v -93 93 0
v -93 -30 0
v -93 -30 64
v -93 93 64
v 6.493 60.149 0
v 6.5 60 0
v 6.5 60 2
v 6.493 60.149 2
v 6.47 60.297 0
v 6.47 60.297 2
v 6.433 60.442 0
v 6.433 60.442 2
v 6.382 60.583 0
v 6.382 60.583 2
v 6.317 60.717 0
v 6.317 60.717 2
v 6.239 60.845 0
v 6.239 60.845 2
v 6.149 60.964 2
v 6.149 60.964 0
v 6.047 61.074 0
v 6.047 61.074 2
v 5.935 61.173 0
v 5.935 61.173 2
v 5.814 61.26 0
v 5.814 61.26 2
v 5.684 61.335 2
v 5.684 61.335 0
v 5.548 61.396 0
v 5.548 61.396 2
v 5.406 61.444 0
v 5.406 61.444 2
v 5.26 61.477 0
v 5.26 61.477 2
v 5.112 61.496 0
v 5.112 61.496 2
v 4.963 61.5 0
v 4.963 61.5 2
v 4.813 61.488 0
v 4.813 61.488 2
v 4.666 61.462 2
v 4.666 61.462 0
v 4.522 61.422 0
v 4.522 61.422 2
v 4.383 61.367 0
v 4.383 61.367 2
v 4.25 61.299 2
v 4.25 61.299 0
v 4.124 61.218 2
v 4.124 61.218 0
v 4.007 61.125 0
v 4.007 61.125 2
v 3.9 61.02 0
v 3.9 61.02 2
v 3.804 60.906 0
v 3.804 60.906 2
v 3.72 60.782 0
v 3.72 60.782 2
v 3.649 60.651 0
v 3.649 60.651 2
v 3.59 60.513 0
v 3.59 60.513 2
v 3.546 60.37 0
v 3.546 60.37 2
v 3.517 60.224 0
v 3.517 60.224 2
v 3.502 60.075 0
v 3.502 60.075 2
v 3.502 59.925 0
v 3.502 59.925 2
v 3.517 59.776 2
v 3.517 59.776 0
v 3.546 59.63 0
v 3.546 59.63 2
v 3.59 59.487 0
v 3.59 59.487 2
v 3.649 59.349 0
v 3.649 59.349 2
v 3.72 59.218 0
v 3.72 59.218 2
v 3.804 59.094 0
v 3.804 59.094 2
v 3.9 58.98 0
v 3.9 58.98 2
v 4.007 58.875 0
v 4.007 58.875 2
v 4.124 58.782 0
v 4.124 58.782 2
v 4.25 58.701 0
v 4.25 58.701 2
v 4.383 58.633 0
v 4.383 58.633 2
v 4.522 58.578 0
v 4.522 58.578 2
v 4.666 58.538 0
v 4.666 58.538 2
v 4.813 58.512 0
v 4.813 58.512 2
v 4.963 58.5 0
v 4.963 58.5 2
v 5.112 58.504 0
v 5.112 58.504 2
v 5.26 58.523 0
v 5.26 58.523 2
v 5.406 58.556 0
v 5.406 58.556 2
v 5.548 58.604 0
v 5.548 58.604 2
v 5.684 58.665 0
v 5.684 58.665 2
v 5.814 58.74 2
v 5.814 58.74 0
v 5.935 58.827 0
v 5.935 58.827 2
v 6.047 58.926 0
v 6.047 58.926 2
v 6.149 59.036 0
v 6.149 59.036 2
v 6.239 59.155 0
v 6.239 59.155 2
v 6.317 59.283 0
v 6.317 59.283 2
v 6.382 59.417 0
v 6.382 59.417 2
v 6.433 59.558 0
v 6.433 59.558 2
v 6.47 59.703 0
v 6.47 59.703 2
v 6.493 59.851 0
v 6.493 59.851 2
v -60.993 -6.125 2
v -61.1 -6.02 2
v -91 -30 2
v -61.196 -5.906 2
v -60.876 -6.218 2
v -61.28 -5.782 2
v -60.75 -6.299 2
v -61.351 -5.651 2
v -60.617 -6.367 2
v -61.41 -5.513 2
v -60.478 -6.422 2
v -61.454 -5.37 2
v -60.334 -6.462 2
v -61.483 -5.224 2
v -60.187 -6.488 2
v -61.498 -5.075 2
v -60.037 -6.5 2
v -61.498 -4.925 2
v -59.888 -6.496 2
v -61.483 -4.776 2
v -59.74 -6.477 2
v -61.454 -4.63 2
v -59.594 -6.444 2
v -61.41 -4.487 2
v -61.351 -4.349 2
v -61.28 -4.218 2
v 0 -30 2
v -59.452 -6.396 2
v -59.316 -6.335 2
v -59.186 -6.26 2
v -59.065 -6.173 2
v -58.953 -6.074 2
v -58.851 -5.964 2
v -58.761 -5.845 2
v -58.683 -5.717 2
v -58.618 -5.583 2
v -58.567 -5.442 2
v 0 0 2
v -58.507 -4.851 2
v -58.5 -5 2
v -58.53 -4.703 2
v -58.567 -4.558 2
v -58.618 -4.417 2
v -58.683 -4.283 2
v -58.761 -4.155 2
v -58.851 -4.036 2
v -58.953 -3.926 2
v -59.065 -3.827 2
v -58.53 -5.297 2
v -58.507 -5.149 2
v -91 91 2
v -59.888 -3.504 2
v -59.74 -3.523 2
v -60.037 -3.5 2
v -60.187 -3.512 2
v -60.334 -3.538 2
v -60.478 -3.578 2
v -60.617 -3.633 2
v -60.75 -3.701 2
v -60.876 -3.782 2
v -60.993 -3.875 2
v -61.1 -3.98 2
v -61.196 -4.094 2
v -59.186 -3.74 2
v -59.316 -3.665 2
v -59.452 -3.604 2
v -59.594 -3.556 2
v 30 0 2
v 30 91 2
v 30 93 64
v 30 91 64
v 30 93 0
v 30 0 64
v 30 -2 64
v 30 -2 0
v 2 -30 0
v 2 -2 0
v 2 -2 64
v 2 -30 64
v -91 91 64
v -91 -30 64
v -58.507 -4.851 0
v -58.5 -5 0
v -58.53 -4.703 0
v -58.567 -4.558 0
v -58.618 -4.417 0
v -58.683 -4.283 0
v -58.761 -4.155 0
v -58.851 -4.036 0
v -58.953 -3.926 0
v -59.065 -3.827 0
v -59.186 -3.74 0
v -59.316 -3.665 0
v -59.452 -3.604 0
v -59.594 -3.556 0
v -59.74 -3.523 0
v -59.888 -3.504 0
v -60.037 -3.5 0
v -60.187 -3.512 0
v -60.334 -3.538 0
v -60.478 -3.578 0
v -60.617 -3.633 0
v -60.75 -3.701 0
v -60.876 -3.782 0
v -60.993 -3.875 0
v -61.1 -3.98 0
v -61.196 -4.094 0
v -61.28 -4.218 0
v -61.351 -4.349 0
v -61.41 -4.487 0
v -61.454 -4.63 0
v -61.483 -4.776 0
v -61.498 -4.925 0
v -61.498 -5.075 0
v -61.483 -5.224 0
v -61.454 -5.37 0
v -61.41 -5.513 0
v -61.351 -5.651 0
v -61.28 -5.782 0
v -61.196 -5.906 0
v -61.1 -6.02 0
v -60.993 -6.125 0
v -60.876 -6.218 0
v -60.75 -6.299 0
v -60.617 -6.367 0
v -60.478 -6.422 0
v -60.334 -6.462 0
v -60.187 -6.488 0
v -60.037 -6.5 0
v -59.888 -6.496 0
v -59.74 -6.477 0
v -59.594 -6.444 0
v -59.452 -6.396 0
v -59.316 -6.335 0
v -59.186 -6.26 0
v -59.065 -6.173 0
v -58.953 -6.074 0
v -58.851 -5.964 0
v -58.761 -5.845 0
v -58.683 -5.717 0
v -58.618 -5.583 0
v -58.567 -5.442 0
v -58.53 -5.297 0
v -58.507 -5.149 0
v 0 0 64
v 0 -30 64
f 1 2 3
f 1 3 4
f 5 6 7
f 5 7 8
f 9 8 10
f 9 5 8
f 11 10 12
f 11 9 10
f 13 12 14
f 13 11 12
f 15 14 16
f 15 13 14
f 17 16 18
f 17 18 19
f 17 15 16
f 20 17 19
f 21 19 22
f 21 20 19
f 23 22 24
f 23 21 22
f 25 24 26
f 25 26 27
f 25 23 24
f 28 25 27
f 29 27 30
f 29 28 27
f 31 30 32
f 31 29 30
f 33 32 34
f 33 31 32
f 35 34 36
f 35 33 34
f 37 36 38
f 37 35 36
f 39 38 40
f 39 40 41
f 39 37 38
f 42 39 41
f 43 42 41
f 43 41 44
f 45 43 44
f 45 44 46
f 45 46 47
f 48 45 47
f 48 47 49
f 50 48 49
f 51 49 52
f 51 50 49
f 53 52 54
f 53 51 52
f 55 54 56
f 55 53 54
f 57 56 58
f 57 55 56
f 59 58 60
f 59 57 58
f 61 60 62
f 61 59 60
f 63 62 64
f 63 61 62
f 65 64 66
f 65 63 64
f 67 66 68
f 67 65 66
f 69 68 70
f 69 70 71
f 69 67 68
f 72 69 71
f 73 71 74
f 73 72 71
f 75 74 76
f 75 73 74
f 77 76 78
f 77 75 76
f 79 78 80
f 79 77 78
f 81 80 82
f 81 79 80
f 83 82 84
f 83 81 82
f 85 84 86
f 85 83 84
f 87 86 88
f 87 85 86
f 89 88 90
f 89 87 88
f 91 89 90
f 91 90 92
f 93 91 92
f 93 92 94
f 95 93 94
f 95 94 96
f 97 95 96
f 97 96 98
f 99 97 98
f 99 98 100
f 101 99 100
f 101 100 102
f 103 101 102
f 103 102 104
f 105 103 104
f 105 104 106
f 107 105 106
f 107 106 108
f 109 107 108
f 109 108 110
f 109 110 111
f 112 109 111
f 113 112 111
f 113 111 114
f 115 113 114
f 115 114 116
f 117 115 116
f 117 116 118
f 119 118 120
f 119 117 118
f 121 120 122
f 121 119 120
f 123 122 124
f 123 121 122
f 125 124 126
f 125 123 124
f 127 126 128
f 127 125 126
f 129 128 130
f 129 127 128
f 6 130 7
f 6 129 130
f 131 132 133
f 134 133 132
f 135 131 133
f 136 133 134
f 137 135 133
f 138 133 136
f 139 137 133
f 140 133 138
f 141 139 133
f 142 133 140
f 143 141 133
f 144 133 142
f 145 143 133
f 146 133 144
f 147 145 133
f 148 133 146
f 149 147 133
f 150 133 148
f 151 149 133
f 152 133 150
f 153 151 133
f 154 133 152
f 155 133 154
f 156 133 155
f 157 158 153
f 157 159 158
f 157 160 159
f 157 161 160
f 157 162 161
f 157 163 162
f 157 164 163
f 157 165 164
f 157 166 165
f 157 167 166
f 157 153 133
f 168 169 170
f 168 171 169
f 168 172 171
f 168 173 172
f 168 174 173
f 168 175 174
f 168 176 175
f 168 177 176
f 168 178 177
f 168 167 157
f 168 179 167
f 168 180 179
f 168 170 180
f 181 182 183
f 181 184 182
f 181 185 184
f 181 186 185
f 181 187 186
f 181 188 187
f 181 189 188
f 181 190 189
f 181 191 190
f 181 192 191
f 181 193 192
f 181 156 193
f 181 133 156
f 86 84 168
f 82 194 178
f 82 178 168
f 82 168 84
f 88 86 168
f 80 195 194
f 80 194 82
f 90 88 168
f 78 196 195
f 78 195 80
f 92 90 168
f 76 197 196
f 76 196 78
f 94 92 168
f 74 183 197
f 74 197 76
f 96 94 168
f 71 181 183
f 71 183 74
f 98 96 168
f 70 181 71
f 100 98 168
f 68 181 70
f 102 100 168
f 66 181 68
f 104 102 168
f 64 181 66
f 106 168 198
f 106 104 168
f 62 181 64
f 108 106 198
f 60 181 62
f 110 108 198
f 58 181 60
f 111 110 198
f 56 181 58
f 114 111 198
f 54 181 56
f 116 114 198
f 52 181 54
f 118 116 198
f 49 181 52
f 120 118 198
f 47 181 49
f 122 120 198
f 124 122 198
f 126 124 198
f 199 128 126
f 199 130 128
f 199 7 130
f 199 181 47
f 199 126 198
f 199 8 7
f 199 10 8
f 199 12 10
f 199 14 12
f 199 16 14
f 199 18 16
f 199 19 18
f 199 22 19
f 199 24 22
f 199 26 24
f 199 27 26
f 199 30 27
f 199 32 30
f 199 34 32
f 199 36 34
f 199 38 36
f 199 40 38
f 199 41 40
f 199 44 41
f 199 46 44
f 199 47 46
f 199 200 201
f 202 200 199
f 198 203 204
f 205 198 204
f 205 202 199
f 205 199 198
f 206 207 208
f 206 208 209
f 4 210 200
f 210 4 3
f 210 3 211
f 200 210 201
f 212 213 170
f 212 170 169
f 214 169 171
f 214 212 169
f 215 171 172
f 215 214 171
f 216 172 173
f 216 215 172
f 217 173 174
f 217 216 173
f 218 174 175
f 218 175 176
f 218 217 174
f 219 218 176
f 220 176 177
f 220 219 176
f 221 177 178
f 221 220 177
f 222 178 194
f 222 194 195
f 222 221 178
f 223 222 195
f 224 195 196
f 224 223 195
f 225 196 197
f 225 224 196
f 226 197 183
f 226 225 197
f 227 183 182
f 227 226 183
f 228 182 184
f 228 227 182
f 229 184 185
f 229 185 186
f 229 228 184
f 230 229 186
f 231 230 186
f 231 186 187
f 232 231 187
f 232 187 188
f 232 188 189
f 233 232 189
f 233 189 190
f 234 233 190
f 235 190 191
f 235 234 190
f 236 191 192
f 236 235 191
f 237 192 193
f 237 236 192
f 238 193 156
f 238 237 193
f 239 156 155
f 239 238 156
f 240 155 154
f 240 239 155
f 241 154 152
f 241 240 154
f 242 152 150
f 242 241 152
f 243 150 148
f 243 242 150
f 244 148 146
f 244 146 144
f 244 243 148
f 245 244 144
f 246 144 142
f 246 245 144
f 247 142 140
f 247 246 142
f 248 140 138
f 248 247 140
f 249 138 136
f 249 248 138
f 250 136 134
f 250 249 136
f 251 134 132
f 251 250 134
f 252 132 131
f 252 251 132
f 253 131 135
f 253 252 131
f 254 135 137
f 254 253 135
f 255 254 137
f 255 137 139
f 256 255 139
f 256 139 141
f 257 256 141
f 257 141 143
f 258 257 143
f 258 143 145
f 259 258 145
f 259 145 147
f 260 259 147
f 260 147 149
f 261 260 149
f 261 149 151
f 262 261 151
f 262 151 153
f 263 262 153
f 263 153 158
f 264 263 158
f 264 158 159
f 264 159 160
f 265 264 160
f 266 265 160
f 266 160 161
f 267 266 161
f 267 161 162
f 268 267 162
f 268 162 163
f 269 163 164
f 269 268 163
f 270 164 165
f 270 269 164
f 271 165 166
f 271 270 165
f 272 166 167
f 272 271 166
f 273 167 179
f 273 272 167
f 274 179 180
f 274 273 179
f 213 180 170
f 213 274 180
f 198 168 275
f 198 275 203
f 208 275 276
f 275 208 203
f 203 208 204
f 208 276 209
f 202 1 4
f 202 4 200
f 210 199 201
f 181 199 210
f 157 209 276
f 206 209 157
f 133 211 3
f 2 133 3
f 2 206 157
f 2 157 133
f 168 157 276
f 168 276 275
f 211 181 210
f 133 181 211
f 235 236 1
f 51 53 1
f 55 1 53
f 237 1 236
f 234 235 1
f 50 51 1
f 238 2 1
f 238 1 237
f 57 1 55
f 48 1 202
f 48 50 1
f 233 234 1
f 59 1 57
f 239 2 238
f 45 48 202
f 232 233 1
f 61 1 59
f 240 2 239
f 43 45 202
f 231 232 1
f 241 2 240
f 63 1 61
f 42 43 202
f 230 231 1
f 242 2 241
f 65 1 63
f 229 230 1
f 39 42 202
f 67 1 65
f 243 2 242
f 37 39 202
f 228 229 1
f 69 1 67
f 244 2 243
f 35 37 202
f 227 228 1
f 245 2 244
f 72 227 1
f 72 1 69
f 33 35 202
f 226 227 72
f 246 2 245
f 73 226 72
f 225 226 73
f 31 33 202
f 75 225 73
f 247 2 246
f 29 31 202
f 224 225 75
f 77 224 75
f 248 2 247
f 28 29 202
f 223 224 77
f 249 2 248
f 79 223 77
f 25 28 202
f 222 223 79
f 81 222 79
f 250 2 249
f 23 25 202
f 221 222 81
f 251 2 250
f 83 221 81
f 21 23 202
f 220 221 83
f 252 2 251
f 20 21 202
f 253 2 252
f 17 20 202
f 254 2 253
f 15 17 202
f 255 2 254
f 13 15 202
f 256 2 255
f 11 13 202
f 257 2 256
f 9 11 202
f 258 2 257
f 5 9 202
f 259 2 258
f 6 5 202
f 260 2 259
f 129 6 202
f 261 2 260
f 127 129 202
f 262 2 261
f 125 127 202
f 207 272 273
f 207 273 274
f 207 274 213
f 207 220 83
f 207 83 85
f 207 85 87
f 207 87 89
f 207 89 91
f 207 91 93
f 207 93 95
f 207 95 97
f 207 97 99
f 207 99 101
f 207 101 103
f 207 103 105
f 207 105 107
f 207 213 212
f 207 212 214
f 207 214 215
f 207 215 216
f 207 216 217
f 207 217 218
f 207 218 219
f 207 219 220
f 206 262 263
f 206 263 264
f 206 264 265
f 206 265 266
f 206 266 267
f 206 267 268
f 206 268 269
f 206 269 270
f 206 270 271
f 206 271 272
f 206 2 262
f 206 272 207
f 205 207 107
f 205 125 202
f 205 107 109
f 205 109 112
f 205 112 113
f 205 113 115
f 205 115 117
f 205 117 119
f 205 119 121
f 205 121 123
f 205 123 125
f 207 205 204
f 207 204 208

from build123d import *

# Parameters (mm, degrees)
SKETCH_R     = 1.5
PAD_DEPTH    = 2
PAD001_DEPTH = 64


with BuildPart() as part:
    # Sketch → Pad (new body)
    with BuildSketch(Plane.XY):
        Polygon((0, 0), (30, 0), (30, 91), (-91, 91), (-91, -30), (0, -30), align=None)
        with Locations((-60, -5)):
            Circle(SKETCH_R, mode=Mode.SUBTRACT)
        with Locations((5, 60)):
            Circle(SKETCH_R, mode=Mode.SUBTRACT)
    extrude(amount=PAD_DEPTH)

    # Sketch001 (on Face9 of Pad) → Pad001 (join)
    with BuildSketch(Plane(origin=(0, 0, 0), x_dir=(1, 0, 0), z_dir=(0, 0, -1))):
        Polygon((-91, 30), (-93, 30), (-93, -93), (-91, -93), (30, -93), (30, -91), (-91, -91), align=None)
        Polygon((0, 30), (0, 0), (30, 0), (30, 2), (2, 2), (2, 30), align=None)
    extrude(amount=-PAD001_DEPTH)


solid = part.part
